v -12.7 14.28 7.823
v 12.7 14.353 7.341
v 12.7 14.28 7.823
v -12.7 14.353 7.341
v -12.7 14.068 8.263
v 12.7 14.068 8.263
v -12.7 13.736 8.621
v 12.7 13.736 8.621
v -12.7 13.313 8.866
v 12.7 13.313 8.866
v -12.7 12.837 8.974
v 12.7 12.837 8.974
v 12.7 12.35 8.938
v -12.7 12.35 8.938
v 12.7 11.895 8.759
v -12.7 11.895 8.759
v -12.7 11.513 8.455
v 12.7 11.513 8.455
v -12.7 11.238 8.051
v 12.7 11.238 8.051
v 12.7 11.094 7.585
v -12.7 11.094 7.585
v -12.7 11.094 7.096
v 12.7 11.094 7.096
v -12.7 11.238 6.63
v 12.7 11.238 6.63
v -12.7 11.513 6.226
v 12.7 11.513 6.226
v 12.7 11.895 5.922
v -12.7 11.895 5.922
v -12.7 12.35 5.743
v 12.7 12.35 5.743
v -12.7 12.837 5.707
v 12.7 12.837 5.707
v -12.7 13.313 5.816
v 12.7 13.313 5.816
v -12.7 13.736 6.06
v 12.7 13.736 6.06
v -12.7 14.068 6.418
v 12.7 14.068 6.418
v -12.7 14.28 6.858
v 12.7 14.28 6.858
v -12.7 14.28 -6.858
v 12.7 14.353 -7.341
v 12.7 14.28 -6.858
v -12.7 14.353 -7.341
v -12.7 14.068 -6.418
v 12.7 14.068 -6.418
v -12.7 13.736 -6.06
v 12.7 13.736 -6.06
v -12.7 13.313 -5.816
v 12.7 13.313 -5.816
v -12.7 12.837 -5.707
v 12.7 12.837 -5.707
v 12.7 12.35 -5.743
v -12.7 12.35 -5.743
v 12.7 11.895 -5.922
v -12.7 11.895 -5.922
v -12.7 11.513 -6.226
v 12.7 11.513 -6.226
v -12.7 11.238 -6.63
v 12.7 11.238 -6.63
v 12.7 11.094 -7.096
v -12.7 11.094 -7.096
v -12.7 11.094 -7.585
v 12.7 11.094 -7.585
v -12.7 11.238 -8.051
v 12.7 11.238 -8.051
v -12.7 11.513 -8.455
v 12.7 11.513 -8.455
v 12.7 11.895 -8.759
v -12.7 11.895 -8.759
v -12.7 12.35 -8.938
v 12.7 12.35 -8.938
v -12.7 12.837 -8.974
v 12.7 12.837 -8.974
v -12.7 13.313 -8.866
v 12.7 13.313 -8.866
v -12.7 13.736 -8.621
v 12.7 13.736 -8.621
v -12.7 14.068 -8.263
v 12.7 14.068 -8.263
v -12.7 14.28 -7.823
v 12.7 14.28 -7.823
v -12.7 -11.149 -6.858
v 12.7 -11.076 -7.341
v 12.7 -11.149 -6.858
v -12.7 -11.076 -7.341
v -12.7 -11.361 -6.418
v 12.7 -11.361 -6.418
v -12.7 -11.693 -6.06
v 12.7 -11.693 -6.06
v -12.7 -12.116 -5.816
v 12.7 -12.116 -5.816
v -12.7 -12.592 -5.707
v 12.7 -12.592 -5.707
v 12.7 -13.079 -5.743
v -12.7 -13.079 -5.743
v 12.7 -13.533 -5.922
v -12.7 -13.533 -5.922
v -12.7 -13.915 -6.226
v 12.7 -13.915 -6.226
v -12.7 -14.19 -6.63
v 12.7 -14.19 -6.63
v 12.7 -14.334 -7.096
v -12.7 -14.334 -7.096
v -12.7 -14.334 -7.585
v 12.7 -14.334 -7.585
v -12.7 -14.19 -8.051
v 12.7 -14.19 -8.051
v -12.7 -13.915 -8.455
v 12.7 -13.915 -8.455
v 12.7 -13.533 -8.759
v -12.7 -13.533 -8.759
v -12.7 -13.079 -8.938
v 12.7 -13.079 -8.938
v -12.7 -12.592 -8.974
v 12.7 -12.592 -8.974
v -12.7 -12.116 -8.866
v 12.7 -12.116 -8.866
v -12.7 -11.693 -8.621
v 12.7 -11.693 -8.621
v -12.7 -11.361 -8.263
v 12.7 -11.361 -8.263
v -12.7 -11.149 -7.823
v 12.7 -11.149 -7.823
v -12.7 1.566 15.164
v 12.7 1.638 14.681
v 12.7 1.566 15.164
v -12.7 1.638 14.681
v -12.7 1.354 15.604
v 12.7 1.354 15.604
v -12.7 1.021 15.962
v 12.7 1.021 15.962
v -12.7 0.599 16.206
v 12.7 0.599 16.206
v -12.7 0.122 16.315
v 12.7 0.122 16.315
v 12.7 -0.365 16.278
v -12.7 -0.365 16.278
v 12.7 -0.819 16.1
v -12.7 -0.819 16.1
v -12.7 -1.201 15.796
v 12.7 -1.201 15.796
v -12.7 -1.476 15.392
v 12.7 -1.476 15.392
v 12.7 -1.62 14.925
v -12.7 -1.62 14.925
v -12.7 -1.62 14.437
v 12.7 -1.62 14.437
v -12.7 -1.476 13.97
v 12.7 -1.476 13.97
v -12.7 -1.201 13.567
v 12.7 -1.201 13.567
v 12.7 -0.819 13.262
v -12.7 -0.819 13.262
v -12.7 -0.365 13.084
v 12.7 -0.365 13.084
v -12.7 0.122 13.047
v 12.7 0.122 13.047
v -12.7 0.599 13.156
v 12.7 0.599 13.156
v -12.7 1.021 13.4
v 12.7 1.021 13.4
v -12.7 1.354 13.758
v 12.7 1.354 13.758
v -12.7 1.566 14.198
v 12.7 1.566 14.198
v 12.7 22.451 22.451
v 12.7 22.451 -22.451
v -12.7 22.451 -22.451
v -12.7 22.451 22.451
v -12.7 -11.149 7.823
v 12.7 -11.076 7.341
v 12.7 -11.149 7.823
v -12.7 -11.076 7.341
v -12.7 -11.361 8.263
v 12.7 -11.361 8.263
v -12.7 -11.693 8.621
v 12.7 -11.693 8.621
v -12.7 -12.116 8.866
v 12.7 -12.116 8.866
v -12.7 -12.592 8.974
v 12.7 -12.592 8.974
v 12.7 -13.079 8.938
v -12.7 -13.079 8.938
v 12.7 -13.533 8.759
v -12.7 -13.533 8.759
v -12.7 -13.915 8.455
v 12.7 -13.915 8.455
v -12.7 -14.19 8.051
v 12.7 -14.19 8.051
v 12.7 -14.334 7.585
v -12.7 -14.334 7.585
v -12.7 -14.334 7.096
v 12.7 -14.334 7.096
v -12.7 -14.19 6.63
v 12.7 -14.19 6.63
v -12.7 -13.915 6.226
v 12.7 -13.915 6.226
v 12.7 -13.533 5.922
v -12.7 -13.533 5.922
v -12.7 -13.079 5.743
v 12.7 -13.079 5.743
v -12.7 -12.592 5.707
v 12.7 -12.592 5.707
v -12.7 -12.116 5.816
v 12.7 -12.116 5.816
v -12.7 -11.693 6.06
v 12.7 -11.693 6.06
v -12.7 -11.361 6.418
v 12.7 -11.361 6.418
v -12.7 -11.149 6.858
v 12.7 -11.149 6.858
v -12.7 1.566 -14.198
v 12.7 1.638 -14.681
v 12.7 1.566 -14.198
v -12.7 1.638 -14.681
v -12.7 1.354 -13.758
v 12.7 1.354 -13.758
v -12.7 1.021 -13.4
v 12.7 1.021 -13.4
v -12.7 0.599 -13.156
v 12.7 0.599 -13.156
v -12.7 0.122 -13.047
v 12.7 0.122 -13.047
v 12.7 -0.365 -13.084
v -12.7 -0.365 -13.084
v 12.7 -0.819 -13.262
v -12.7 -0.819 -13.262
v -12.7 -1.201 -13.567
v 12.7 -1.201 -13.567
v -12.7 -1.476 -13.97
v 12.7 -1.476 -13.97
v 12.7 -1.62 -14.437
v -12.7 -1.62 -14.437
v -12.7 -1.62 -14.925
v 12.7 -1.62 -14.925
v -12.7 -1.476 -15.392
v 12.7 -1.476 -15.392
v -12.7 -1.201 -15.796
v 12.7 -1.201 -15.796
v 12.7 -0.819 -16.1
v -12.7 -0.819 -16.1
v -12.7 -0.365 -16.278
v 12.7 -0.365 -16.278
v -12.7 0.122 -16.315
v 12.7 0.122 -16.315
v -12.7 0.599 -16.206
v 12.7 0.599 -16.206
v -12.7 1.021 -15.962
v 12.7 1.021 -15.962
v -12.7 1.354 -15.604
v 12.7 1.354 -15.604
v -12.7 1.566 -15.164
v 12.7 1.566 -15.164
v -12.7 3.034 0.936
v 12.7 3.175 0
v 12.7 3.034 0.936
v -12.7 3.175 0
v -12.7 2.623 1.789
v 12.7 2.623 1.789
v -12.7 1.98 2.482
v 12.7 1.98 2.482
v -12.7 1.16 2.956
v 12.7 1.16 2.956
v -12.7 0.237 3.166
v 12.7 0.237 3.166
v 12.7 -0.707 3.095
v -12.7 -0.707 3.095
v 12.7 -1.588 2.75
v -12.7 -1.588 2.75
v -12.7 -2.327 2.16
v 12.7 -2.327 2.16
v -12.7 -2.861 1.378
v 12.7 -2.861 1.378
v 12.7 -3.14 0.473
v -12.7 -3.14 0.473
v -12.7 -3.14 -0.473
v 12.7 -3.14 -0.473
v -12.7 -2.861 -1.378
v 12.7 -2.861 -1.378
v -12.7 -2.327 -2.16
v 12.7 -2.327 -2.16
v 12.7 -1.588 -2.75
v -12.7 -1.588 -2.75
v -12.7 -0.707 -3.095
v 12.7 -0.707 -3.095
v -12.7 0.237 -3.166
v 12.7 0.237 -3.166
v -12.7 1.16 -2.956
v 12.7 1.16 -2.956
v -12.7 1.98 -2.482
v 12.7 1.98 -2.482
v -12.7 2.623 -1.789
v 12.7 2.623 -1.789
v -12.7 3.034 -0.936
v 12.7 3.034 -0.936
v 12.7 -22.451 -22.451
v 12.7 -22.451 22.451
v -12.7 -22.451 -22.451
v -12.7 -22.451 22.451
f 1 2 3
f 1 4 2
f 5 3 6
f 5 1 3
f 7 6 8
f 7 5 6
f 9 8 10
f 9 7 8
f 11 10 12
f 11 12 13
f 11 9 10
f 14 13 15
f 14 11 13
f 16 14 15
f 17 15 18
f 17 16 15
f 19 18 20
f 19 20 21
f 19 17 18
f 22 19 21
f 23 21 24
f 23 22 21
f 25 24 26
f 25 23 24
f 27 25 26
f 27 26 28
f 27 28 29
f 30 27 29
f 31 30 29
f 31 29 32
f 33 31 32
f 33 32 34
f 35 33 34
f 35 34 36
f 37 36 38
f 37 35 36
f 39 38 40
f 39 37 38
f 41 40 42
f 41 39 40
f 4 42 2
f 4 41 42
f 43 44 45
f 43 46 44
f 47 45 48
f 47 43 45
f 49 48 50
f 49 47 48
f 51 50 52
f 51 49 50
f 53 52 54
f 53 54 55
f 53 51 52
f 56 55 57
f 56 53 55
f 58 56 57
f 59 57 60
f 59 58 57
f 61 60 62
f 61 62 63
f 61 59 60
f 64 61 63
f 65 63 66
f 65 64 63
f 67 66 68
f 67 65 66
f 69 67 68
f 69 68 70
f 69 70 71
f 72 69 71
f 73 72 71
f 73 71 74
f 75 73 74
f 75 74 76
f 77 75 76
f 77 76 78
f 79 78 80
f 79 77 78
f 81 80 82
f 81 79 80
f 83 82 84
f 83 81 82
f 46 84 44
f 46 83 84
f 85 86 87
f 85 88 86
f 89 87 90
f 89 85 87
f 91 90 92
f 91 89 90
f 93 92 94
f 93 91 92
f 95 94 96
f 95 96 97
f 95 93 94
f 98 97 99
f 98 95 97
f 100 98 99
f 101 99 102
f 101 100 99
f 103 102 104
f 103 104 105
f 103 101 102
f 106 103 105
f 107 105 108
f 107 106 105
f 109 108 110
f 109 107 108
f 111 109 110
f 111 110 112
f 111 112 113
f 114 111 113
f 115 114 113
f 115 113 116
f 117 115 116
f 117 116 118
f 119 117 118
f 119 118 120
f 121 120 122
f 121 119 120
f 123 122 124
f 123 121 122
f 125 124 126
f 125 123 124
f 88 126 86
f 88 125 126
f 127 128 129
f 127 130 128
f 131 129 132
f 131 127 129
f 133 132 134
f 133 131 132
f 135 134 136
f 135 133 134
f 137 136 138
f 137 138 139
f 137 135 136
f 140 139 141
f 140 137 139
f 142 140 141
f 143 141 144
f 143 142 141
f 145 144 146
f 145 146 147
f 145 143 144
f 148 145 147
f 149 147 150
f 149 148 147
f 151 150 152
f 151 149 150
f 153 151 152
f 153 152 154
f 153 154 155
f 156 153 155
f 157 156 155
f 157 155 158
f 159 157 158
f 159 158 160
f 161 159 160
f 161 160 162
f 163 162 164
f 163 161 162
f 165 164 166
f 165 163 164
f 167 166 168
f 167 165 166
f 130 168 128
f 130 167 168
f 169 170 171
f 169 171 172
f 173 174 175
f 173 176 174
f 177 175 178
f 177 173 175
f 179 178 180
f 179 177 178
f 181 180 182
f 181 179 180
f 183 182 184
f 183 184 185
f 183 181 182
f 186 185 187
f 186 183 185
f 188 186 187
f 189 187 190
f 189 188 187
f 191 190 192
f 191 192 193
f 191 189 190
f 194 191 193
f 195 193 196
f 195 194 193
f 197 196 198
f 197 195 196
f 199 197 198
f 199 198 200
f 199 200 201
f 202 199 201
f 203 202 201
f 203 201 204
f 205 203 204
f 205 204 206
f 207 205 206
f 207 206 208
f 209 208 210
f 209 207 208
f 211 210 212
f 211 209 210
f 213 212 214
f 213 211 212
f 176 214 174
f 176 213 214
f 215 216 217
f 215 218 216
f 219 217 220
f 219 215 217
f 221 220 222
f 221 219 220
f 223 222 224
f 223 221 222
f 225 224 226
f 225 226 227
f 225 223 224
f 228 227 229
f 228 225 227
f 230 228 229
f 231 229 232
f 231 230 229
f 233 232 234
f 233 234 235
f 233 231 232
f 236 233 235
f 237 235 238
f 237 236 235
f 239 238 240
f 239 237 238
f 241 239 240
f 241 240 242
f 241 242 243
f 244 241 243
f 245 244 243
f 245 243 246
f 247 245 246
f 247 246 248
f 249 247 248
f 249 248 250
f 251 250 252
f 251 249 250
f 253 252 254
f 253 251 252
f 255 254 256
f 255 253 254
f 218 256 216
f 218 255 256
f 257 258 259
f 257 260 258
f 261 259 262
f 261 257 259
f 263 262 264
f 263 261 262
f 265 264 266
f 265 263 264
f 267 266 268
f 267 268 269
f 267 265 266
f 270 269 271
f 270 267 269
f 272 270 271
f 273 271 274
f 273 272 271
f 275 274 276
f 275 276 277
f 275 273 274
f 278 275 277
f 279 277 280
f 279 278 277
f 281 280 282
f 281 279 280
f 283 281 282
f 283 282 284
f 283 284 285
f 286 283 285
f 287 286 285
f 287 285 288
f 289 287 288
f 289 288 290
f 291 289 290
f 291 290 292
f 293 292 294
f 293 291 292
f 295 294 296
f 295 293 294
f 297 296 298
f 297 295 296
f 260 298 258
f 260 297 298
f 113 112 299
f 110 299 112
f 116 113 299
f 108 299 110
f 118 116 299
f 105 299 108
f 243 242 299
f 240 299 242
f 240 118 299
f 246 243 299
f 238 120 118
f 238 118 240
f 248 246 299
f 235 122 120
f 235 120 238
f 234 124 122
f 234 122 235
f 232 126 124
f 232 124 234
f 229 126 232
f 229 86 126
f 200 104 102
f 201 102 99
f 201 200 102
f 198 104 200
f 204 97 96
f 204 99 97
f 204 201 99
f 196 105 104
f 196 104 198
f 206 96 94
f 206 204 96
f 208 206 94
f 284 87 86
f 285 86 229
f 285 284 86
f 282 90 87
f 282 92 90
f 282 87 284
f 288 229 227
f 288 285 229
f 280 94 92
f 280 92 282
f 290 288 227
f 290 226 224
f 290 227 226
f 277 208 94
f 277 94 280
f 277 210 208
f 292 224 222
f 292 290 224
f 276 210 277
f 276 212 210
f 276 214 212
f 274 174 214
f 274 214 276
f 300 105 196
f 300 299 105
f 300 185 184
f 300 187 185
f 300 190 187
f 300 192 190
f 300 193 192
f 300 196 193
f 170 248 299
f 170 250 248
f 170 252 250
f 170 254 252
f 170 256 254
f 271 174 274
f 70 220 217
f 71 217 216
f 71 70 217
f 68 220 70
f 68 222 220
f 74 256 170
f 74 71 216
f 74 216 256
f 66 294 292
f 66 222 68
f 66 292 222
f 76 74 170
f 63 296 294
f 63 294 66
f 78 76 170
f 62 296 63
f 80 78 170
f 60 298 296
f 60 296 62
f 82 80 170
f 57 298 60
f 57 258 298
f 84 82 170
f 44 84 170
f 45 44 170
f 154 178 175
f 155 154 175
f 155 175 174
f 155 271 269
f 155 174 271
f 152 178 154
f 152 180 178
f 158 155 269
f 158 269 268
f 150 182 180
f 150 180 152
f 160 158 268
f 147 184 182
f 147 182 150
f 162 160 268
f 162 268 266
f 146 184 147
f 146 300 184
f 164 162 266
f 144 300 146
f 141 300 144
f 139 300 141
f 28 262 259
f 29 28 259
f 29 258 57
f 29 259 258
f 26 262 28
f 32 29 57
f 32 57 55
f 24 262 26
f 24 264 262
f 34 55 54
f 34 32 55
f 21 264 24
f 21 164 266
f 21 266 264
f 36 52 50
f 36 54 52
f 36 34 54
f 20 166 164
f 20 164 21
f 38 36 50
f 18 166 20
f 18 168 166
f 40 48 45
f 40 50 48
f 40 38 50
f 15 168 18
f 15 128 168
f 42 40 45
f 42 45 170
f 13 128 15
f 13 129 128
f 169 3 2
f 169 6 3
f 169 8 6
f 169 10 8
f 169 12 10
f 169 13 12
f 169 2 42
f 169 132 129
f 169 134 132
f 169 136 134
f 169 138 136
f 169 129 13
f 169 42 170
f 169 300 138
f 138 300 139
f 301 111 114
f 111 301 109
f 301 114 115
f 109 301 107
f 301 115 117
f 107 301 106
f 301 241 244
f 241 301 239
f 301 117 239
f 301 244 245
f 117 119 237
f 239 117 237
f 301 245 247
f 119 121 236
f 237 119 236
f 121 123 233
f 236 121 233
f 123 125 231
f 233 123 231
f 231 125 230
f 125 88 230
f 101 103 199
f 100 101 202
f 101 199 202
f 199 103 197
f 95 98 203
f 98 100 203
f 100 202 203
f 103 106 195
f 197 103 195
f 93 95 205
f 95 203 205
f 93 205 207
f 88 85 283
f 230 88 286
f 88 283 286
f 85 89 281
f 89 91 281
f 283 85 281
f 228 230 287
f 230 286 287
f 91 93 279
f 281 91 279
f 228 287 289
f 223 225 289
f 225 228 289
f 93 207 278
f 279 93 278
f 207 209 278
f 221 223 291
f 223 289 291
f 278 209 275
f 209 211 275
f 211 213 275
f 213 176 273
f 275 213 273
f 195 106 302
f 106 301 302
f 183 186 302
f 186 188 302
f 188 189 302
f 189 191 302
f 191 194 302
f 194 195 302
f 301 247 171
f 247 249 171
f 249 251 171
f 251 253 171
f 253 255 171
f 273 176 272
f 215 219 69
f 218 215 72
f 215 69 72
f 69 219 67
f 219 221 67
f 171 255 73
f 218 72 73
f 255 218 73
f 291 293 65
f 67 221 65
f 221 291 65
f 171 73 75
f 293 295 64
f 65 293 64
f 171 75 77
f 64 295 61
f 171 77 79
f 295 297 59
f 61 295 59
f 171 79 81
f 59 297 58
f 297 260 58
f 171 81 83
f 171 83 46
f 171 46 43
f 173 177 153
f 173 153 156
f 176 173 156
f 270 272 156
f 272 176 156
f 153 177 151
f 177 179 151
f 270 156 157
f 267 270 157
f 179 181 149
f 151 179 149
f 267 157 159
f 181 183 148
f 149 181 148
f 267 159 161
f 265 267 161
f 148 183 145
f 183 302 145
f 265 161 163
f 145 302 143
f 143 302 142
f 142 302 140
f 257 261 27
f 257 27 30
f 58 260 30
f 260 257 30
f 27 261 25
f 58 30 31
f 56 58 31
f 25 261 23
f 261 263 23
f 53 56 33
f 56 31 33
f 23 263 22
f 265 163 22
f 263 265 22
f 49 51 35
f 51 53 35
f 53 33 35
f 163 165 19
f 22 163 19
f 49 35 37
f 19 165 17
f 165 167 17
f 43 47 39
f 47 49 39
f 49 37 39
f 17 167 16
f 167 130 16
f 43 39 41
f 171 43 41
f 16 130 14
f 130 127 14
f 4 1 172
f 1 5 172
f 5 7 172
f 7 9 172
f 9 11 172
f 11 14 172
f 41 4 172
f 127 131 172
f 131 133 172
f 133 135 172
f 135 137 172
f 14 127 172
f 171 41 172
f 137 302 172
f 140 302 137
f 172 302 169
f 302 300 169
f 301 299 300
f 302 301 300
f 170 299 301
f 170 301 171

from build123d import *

# Parameters (mm, degrees)
F0_W     = 44.90128
F0_H     = 44.90128
F0_R     = 1.6383
F0_R_2   = 3.175
F1_DEPTH = 12.7


with BuildPart() as f1:
    # F0 (on Right) → F1 (new body, symmetric)
    with BuildSketch(Plane.YZ):
        Rectangle(F0_W, F0_H)
        with Locations((-12.714292, -7.3406)):
            Circle(F0_R, mode=Mode.SUBTRACT)
        with Locations((0, -14.6812)):
            Circle(F0_R, mode=Mode.SUBTRACT)
        with Locations((12.714292, -7.3406)):
            Circle(F0_R, mode=Mode.SUBTRACT)
        with Locations((-12.714292, 7.3406)):
            Circle(F0_R, mode=Mode.SUBTRACT)
        Circle(F0_R_2, mode=Mode.SUBTRACT)
        with Locations((12.714292, 7.3406)):
            Circle(F0_R, mode=Mode.SUBTRACT)
        with Locations((0, 14.6812)):
            Circle(F0_R, mode=Mode.SUBTRACT)
    extrude(amount=F1_DEPTH, both=True)


solid = f1.part
